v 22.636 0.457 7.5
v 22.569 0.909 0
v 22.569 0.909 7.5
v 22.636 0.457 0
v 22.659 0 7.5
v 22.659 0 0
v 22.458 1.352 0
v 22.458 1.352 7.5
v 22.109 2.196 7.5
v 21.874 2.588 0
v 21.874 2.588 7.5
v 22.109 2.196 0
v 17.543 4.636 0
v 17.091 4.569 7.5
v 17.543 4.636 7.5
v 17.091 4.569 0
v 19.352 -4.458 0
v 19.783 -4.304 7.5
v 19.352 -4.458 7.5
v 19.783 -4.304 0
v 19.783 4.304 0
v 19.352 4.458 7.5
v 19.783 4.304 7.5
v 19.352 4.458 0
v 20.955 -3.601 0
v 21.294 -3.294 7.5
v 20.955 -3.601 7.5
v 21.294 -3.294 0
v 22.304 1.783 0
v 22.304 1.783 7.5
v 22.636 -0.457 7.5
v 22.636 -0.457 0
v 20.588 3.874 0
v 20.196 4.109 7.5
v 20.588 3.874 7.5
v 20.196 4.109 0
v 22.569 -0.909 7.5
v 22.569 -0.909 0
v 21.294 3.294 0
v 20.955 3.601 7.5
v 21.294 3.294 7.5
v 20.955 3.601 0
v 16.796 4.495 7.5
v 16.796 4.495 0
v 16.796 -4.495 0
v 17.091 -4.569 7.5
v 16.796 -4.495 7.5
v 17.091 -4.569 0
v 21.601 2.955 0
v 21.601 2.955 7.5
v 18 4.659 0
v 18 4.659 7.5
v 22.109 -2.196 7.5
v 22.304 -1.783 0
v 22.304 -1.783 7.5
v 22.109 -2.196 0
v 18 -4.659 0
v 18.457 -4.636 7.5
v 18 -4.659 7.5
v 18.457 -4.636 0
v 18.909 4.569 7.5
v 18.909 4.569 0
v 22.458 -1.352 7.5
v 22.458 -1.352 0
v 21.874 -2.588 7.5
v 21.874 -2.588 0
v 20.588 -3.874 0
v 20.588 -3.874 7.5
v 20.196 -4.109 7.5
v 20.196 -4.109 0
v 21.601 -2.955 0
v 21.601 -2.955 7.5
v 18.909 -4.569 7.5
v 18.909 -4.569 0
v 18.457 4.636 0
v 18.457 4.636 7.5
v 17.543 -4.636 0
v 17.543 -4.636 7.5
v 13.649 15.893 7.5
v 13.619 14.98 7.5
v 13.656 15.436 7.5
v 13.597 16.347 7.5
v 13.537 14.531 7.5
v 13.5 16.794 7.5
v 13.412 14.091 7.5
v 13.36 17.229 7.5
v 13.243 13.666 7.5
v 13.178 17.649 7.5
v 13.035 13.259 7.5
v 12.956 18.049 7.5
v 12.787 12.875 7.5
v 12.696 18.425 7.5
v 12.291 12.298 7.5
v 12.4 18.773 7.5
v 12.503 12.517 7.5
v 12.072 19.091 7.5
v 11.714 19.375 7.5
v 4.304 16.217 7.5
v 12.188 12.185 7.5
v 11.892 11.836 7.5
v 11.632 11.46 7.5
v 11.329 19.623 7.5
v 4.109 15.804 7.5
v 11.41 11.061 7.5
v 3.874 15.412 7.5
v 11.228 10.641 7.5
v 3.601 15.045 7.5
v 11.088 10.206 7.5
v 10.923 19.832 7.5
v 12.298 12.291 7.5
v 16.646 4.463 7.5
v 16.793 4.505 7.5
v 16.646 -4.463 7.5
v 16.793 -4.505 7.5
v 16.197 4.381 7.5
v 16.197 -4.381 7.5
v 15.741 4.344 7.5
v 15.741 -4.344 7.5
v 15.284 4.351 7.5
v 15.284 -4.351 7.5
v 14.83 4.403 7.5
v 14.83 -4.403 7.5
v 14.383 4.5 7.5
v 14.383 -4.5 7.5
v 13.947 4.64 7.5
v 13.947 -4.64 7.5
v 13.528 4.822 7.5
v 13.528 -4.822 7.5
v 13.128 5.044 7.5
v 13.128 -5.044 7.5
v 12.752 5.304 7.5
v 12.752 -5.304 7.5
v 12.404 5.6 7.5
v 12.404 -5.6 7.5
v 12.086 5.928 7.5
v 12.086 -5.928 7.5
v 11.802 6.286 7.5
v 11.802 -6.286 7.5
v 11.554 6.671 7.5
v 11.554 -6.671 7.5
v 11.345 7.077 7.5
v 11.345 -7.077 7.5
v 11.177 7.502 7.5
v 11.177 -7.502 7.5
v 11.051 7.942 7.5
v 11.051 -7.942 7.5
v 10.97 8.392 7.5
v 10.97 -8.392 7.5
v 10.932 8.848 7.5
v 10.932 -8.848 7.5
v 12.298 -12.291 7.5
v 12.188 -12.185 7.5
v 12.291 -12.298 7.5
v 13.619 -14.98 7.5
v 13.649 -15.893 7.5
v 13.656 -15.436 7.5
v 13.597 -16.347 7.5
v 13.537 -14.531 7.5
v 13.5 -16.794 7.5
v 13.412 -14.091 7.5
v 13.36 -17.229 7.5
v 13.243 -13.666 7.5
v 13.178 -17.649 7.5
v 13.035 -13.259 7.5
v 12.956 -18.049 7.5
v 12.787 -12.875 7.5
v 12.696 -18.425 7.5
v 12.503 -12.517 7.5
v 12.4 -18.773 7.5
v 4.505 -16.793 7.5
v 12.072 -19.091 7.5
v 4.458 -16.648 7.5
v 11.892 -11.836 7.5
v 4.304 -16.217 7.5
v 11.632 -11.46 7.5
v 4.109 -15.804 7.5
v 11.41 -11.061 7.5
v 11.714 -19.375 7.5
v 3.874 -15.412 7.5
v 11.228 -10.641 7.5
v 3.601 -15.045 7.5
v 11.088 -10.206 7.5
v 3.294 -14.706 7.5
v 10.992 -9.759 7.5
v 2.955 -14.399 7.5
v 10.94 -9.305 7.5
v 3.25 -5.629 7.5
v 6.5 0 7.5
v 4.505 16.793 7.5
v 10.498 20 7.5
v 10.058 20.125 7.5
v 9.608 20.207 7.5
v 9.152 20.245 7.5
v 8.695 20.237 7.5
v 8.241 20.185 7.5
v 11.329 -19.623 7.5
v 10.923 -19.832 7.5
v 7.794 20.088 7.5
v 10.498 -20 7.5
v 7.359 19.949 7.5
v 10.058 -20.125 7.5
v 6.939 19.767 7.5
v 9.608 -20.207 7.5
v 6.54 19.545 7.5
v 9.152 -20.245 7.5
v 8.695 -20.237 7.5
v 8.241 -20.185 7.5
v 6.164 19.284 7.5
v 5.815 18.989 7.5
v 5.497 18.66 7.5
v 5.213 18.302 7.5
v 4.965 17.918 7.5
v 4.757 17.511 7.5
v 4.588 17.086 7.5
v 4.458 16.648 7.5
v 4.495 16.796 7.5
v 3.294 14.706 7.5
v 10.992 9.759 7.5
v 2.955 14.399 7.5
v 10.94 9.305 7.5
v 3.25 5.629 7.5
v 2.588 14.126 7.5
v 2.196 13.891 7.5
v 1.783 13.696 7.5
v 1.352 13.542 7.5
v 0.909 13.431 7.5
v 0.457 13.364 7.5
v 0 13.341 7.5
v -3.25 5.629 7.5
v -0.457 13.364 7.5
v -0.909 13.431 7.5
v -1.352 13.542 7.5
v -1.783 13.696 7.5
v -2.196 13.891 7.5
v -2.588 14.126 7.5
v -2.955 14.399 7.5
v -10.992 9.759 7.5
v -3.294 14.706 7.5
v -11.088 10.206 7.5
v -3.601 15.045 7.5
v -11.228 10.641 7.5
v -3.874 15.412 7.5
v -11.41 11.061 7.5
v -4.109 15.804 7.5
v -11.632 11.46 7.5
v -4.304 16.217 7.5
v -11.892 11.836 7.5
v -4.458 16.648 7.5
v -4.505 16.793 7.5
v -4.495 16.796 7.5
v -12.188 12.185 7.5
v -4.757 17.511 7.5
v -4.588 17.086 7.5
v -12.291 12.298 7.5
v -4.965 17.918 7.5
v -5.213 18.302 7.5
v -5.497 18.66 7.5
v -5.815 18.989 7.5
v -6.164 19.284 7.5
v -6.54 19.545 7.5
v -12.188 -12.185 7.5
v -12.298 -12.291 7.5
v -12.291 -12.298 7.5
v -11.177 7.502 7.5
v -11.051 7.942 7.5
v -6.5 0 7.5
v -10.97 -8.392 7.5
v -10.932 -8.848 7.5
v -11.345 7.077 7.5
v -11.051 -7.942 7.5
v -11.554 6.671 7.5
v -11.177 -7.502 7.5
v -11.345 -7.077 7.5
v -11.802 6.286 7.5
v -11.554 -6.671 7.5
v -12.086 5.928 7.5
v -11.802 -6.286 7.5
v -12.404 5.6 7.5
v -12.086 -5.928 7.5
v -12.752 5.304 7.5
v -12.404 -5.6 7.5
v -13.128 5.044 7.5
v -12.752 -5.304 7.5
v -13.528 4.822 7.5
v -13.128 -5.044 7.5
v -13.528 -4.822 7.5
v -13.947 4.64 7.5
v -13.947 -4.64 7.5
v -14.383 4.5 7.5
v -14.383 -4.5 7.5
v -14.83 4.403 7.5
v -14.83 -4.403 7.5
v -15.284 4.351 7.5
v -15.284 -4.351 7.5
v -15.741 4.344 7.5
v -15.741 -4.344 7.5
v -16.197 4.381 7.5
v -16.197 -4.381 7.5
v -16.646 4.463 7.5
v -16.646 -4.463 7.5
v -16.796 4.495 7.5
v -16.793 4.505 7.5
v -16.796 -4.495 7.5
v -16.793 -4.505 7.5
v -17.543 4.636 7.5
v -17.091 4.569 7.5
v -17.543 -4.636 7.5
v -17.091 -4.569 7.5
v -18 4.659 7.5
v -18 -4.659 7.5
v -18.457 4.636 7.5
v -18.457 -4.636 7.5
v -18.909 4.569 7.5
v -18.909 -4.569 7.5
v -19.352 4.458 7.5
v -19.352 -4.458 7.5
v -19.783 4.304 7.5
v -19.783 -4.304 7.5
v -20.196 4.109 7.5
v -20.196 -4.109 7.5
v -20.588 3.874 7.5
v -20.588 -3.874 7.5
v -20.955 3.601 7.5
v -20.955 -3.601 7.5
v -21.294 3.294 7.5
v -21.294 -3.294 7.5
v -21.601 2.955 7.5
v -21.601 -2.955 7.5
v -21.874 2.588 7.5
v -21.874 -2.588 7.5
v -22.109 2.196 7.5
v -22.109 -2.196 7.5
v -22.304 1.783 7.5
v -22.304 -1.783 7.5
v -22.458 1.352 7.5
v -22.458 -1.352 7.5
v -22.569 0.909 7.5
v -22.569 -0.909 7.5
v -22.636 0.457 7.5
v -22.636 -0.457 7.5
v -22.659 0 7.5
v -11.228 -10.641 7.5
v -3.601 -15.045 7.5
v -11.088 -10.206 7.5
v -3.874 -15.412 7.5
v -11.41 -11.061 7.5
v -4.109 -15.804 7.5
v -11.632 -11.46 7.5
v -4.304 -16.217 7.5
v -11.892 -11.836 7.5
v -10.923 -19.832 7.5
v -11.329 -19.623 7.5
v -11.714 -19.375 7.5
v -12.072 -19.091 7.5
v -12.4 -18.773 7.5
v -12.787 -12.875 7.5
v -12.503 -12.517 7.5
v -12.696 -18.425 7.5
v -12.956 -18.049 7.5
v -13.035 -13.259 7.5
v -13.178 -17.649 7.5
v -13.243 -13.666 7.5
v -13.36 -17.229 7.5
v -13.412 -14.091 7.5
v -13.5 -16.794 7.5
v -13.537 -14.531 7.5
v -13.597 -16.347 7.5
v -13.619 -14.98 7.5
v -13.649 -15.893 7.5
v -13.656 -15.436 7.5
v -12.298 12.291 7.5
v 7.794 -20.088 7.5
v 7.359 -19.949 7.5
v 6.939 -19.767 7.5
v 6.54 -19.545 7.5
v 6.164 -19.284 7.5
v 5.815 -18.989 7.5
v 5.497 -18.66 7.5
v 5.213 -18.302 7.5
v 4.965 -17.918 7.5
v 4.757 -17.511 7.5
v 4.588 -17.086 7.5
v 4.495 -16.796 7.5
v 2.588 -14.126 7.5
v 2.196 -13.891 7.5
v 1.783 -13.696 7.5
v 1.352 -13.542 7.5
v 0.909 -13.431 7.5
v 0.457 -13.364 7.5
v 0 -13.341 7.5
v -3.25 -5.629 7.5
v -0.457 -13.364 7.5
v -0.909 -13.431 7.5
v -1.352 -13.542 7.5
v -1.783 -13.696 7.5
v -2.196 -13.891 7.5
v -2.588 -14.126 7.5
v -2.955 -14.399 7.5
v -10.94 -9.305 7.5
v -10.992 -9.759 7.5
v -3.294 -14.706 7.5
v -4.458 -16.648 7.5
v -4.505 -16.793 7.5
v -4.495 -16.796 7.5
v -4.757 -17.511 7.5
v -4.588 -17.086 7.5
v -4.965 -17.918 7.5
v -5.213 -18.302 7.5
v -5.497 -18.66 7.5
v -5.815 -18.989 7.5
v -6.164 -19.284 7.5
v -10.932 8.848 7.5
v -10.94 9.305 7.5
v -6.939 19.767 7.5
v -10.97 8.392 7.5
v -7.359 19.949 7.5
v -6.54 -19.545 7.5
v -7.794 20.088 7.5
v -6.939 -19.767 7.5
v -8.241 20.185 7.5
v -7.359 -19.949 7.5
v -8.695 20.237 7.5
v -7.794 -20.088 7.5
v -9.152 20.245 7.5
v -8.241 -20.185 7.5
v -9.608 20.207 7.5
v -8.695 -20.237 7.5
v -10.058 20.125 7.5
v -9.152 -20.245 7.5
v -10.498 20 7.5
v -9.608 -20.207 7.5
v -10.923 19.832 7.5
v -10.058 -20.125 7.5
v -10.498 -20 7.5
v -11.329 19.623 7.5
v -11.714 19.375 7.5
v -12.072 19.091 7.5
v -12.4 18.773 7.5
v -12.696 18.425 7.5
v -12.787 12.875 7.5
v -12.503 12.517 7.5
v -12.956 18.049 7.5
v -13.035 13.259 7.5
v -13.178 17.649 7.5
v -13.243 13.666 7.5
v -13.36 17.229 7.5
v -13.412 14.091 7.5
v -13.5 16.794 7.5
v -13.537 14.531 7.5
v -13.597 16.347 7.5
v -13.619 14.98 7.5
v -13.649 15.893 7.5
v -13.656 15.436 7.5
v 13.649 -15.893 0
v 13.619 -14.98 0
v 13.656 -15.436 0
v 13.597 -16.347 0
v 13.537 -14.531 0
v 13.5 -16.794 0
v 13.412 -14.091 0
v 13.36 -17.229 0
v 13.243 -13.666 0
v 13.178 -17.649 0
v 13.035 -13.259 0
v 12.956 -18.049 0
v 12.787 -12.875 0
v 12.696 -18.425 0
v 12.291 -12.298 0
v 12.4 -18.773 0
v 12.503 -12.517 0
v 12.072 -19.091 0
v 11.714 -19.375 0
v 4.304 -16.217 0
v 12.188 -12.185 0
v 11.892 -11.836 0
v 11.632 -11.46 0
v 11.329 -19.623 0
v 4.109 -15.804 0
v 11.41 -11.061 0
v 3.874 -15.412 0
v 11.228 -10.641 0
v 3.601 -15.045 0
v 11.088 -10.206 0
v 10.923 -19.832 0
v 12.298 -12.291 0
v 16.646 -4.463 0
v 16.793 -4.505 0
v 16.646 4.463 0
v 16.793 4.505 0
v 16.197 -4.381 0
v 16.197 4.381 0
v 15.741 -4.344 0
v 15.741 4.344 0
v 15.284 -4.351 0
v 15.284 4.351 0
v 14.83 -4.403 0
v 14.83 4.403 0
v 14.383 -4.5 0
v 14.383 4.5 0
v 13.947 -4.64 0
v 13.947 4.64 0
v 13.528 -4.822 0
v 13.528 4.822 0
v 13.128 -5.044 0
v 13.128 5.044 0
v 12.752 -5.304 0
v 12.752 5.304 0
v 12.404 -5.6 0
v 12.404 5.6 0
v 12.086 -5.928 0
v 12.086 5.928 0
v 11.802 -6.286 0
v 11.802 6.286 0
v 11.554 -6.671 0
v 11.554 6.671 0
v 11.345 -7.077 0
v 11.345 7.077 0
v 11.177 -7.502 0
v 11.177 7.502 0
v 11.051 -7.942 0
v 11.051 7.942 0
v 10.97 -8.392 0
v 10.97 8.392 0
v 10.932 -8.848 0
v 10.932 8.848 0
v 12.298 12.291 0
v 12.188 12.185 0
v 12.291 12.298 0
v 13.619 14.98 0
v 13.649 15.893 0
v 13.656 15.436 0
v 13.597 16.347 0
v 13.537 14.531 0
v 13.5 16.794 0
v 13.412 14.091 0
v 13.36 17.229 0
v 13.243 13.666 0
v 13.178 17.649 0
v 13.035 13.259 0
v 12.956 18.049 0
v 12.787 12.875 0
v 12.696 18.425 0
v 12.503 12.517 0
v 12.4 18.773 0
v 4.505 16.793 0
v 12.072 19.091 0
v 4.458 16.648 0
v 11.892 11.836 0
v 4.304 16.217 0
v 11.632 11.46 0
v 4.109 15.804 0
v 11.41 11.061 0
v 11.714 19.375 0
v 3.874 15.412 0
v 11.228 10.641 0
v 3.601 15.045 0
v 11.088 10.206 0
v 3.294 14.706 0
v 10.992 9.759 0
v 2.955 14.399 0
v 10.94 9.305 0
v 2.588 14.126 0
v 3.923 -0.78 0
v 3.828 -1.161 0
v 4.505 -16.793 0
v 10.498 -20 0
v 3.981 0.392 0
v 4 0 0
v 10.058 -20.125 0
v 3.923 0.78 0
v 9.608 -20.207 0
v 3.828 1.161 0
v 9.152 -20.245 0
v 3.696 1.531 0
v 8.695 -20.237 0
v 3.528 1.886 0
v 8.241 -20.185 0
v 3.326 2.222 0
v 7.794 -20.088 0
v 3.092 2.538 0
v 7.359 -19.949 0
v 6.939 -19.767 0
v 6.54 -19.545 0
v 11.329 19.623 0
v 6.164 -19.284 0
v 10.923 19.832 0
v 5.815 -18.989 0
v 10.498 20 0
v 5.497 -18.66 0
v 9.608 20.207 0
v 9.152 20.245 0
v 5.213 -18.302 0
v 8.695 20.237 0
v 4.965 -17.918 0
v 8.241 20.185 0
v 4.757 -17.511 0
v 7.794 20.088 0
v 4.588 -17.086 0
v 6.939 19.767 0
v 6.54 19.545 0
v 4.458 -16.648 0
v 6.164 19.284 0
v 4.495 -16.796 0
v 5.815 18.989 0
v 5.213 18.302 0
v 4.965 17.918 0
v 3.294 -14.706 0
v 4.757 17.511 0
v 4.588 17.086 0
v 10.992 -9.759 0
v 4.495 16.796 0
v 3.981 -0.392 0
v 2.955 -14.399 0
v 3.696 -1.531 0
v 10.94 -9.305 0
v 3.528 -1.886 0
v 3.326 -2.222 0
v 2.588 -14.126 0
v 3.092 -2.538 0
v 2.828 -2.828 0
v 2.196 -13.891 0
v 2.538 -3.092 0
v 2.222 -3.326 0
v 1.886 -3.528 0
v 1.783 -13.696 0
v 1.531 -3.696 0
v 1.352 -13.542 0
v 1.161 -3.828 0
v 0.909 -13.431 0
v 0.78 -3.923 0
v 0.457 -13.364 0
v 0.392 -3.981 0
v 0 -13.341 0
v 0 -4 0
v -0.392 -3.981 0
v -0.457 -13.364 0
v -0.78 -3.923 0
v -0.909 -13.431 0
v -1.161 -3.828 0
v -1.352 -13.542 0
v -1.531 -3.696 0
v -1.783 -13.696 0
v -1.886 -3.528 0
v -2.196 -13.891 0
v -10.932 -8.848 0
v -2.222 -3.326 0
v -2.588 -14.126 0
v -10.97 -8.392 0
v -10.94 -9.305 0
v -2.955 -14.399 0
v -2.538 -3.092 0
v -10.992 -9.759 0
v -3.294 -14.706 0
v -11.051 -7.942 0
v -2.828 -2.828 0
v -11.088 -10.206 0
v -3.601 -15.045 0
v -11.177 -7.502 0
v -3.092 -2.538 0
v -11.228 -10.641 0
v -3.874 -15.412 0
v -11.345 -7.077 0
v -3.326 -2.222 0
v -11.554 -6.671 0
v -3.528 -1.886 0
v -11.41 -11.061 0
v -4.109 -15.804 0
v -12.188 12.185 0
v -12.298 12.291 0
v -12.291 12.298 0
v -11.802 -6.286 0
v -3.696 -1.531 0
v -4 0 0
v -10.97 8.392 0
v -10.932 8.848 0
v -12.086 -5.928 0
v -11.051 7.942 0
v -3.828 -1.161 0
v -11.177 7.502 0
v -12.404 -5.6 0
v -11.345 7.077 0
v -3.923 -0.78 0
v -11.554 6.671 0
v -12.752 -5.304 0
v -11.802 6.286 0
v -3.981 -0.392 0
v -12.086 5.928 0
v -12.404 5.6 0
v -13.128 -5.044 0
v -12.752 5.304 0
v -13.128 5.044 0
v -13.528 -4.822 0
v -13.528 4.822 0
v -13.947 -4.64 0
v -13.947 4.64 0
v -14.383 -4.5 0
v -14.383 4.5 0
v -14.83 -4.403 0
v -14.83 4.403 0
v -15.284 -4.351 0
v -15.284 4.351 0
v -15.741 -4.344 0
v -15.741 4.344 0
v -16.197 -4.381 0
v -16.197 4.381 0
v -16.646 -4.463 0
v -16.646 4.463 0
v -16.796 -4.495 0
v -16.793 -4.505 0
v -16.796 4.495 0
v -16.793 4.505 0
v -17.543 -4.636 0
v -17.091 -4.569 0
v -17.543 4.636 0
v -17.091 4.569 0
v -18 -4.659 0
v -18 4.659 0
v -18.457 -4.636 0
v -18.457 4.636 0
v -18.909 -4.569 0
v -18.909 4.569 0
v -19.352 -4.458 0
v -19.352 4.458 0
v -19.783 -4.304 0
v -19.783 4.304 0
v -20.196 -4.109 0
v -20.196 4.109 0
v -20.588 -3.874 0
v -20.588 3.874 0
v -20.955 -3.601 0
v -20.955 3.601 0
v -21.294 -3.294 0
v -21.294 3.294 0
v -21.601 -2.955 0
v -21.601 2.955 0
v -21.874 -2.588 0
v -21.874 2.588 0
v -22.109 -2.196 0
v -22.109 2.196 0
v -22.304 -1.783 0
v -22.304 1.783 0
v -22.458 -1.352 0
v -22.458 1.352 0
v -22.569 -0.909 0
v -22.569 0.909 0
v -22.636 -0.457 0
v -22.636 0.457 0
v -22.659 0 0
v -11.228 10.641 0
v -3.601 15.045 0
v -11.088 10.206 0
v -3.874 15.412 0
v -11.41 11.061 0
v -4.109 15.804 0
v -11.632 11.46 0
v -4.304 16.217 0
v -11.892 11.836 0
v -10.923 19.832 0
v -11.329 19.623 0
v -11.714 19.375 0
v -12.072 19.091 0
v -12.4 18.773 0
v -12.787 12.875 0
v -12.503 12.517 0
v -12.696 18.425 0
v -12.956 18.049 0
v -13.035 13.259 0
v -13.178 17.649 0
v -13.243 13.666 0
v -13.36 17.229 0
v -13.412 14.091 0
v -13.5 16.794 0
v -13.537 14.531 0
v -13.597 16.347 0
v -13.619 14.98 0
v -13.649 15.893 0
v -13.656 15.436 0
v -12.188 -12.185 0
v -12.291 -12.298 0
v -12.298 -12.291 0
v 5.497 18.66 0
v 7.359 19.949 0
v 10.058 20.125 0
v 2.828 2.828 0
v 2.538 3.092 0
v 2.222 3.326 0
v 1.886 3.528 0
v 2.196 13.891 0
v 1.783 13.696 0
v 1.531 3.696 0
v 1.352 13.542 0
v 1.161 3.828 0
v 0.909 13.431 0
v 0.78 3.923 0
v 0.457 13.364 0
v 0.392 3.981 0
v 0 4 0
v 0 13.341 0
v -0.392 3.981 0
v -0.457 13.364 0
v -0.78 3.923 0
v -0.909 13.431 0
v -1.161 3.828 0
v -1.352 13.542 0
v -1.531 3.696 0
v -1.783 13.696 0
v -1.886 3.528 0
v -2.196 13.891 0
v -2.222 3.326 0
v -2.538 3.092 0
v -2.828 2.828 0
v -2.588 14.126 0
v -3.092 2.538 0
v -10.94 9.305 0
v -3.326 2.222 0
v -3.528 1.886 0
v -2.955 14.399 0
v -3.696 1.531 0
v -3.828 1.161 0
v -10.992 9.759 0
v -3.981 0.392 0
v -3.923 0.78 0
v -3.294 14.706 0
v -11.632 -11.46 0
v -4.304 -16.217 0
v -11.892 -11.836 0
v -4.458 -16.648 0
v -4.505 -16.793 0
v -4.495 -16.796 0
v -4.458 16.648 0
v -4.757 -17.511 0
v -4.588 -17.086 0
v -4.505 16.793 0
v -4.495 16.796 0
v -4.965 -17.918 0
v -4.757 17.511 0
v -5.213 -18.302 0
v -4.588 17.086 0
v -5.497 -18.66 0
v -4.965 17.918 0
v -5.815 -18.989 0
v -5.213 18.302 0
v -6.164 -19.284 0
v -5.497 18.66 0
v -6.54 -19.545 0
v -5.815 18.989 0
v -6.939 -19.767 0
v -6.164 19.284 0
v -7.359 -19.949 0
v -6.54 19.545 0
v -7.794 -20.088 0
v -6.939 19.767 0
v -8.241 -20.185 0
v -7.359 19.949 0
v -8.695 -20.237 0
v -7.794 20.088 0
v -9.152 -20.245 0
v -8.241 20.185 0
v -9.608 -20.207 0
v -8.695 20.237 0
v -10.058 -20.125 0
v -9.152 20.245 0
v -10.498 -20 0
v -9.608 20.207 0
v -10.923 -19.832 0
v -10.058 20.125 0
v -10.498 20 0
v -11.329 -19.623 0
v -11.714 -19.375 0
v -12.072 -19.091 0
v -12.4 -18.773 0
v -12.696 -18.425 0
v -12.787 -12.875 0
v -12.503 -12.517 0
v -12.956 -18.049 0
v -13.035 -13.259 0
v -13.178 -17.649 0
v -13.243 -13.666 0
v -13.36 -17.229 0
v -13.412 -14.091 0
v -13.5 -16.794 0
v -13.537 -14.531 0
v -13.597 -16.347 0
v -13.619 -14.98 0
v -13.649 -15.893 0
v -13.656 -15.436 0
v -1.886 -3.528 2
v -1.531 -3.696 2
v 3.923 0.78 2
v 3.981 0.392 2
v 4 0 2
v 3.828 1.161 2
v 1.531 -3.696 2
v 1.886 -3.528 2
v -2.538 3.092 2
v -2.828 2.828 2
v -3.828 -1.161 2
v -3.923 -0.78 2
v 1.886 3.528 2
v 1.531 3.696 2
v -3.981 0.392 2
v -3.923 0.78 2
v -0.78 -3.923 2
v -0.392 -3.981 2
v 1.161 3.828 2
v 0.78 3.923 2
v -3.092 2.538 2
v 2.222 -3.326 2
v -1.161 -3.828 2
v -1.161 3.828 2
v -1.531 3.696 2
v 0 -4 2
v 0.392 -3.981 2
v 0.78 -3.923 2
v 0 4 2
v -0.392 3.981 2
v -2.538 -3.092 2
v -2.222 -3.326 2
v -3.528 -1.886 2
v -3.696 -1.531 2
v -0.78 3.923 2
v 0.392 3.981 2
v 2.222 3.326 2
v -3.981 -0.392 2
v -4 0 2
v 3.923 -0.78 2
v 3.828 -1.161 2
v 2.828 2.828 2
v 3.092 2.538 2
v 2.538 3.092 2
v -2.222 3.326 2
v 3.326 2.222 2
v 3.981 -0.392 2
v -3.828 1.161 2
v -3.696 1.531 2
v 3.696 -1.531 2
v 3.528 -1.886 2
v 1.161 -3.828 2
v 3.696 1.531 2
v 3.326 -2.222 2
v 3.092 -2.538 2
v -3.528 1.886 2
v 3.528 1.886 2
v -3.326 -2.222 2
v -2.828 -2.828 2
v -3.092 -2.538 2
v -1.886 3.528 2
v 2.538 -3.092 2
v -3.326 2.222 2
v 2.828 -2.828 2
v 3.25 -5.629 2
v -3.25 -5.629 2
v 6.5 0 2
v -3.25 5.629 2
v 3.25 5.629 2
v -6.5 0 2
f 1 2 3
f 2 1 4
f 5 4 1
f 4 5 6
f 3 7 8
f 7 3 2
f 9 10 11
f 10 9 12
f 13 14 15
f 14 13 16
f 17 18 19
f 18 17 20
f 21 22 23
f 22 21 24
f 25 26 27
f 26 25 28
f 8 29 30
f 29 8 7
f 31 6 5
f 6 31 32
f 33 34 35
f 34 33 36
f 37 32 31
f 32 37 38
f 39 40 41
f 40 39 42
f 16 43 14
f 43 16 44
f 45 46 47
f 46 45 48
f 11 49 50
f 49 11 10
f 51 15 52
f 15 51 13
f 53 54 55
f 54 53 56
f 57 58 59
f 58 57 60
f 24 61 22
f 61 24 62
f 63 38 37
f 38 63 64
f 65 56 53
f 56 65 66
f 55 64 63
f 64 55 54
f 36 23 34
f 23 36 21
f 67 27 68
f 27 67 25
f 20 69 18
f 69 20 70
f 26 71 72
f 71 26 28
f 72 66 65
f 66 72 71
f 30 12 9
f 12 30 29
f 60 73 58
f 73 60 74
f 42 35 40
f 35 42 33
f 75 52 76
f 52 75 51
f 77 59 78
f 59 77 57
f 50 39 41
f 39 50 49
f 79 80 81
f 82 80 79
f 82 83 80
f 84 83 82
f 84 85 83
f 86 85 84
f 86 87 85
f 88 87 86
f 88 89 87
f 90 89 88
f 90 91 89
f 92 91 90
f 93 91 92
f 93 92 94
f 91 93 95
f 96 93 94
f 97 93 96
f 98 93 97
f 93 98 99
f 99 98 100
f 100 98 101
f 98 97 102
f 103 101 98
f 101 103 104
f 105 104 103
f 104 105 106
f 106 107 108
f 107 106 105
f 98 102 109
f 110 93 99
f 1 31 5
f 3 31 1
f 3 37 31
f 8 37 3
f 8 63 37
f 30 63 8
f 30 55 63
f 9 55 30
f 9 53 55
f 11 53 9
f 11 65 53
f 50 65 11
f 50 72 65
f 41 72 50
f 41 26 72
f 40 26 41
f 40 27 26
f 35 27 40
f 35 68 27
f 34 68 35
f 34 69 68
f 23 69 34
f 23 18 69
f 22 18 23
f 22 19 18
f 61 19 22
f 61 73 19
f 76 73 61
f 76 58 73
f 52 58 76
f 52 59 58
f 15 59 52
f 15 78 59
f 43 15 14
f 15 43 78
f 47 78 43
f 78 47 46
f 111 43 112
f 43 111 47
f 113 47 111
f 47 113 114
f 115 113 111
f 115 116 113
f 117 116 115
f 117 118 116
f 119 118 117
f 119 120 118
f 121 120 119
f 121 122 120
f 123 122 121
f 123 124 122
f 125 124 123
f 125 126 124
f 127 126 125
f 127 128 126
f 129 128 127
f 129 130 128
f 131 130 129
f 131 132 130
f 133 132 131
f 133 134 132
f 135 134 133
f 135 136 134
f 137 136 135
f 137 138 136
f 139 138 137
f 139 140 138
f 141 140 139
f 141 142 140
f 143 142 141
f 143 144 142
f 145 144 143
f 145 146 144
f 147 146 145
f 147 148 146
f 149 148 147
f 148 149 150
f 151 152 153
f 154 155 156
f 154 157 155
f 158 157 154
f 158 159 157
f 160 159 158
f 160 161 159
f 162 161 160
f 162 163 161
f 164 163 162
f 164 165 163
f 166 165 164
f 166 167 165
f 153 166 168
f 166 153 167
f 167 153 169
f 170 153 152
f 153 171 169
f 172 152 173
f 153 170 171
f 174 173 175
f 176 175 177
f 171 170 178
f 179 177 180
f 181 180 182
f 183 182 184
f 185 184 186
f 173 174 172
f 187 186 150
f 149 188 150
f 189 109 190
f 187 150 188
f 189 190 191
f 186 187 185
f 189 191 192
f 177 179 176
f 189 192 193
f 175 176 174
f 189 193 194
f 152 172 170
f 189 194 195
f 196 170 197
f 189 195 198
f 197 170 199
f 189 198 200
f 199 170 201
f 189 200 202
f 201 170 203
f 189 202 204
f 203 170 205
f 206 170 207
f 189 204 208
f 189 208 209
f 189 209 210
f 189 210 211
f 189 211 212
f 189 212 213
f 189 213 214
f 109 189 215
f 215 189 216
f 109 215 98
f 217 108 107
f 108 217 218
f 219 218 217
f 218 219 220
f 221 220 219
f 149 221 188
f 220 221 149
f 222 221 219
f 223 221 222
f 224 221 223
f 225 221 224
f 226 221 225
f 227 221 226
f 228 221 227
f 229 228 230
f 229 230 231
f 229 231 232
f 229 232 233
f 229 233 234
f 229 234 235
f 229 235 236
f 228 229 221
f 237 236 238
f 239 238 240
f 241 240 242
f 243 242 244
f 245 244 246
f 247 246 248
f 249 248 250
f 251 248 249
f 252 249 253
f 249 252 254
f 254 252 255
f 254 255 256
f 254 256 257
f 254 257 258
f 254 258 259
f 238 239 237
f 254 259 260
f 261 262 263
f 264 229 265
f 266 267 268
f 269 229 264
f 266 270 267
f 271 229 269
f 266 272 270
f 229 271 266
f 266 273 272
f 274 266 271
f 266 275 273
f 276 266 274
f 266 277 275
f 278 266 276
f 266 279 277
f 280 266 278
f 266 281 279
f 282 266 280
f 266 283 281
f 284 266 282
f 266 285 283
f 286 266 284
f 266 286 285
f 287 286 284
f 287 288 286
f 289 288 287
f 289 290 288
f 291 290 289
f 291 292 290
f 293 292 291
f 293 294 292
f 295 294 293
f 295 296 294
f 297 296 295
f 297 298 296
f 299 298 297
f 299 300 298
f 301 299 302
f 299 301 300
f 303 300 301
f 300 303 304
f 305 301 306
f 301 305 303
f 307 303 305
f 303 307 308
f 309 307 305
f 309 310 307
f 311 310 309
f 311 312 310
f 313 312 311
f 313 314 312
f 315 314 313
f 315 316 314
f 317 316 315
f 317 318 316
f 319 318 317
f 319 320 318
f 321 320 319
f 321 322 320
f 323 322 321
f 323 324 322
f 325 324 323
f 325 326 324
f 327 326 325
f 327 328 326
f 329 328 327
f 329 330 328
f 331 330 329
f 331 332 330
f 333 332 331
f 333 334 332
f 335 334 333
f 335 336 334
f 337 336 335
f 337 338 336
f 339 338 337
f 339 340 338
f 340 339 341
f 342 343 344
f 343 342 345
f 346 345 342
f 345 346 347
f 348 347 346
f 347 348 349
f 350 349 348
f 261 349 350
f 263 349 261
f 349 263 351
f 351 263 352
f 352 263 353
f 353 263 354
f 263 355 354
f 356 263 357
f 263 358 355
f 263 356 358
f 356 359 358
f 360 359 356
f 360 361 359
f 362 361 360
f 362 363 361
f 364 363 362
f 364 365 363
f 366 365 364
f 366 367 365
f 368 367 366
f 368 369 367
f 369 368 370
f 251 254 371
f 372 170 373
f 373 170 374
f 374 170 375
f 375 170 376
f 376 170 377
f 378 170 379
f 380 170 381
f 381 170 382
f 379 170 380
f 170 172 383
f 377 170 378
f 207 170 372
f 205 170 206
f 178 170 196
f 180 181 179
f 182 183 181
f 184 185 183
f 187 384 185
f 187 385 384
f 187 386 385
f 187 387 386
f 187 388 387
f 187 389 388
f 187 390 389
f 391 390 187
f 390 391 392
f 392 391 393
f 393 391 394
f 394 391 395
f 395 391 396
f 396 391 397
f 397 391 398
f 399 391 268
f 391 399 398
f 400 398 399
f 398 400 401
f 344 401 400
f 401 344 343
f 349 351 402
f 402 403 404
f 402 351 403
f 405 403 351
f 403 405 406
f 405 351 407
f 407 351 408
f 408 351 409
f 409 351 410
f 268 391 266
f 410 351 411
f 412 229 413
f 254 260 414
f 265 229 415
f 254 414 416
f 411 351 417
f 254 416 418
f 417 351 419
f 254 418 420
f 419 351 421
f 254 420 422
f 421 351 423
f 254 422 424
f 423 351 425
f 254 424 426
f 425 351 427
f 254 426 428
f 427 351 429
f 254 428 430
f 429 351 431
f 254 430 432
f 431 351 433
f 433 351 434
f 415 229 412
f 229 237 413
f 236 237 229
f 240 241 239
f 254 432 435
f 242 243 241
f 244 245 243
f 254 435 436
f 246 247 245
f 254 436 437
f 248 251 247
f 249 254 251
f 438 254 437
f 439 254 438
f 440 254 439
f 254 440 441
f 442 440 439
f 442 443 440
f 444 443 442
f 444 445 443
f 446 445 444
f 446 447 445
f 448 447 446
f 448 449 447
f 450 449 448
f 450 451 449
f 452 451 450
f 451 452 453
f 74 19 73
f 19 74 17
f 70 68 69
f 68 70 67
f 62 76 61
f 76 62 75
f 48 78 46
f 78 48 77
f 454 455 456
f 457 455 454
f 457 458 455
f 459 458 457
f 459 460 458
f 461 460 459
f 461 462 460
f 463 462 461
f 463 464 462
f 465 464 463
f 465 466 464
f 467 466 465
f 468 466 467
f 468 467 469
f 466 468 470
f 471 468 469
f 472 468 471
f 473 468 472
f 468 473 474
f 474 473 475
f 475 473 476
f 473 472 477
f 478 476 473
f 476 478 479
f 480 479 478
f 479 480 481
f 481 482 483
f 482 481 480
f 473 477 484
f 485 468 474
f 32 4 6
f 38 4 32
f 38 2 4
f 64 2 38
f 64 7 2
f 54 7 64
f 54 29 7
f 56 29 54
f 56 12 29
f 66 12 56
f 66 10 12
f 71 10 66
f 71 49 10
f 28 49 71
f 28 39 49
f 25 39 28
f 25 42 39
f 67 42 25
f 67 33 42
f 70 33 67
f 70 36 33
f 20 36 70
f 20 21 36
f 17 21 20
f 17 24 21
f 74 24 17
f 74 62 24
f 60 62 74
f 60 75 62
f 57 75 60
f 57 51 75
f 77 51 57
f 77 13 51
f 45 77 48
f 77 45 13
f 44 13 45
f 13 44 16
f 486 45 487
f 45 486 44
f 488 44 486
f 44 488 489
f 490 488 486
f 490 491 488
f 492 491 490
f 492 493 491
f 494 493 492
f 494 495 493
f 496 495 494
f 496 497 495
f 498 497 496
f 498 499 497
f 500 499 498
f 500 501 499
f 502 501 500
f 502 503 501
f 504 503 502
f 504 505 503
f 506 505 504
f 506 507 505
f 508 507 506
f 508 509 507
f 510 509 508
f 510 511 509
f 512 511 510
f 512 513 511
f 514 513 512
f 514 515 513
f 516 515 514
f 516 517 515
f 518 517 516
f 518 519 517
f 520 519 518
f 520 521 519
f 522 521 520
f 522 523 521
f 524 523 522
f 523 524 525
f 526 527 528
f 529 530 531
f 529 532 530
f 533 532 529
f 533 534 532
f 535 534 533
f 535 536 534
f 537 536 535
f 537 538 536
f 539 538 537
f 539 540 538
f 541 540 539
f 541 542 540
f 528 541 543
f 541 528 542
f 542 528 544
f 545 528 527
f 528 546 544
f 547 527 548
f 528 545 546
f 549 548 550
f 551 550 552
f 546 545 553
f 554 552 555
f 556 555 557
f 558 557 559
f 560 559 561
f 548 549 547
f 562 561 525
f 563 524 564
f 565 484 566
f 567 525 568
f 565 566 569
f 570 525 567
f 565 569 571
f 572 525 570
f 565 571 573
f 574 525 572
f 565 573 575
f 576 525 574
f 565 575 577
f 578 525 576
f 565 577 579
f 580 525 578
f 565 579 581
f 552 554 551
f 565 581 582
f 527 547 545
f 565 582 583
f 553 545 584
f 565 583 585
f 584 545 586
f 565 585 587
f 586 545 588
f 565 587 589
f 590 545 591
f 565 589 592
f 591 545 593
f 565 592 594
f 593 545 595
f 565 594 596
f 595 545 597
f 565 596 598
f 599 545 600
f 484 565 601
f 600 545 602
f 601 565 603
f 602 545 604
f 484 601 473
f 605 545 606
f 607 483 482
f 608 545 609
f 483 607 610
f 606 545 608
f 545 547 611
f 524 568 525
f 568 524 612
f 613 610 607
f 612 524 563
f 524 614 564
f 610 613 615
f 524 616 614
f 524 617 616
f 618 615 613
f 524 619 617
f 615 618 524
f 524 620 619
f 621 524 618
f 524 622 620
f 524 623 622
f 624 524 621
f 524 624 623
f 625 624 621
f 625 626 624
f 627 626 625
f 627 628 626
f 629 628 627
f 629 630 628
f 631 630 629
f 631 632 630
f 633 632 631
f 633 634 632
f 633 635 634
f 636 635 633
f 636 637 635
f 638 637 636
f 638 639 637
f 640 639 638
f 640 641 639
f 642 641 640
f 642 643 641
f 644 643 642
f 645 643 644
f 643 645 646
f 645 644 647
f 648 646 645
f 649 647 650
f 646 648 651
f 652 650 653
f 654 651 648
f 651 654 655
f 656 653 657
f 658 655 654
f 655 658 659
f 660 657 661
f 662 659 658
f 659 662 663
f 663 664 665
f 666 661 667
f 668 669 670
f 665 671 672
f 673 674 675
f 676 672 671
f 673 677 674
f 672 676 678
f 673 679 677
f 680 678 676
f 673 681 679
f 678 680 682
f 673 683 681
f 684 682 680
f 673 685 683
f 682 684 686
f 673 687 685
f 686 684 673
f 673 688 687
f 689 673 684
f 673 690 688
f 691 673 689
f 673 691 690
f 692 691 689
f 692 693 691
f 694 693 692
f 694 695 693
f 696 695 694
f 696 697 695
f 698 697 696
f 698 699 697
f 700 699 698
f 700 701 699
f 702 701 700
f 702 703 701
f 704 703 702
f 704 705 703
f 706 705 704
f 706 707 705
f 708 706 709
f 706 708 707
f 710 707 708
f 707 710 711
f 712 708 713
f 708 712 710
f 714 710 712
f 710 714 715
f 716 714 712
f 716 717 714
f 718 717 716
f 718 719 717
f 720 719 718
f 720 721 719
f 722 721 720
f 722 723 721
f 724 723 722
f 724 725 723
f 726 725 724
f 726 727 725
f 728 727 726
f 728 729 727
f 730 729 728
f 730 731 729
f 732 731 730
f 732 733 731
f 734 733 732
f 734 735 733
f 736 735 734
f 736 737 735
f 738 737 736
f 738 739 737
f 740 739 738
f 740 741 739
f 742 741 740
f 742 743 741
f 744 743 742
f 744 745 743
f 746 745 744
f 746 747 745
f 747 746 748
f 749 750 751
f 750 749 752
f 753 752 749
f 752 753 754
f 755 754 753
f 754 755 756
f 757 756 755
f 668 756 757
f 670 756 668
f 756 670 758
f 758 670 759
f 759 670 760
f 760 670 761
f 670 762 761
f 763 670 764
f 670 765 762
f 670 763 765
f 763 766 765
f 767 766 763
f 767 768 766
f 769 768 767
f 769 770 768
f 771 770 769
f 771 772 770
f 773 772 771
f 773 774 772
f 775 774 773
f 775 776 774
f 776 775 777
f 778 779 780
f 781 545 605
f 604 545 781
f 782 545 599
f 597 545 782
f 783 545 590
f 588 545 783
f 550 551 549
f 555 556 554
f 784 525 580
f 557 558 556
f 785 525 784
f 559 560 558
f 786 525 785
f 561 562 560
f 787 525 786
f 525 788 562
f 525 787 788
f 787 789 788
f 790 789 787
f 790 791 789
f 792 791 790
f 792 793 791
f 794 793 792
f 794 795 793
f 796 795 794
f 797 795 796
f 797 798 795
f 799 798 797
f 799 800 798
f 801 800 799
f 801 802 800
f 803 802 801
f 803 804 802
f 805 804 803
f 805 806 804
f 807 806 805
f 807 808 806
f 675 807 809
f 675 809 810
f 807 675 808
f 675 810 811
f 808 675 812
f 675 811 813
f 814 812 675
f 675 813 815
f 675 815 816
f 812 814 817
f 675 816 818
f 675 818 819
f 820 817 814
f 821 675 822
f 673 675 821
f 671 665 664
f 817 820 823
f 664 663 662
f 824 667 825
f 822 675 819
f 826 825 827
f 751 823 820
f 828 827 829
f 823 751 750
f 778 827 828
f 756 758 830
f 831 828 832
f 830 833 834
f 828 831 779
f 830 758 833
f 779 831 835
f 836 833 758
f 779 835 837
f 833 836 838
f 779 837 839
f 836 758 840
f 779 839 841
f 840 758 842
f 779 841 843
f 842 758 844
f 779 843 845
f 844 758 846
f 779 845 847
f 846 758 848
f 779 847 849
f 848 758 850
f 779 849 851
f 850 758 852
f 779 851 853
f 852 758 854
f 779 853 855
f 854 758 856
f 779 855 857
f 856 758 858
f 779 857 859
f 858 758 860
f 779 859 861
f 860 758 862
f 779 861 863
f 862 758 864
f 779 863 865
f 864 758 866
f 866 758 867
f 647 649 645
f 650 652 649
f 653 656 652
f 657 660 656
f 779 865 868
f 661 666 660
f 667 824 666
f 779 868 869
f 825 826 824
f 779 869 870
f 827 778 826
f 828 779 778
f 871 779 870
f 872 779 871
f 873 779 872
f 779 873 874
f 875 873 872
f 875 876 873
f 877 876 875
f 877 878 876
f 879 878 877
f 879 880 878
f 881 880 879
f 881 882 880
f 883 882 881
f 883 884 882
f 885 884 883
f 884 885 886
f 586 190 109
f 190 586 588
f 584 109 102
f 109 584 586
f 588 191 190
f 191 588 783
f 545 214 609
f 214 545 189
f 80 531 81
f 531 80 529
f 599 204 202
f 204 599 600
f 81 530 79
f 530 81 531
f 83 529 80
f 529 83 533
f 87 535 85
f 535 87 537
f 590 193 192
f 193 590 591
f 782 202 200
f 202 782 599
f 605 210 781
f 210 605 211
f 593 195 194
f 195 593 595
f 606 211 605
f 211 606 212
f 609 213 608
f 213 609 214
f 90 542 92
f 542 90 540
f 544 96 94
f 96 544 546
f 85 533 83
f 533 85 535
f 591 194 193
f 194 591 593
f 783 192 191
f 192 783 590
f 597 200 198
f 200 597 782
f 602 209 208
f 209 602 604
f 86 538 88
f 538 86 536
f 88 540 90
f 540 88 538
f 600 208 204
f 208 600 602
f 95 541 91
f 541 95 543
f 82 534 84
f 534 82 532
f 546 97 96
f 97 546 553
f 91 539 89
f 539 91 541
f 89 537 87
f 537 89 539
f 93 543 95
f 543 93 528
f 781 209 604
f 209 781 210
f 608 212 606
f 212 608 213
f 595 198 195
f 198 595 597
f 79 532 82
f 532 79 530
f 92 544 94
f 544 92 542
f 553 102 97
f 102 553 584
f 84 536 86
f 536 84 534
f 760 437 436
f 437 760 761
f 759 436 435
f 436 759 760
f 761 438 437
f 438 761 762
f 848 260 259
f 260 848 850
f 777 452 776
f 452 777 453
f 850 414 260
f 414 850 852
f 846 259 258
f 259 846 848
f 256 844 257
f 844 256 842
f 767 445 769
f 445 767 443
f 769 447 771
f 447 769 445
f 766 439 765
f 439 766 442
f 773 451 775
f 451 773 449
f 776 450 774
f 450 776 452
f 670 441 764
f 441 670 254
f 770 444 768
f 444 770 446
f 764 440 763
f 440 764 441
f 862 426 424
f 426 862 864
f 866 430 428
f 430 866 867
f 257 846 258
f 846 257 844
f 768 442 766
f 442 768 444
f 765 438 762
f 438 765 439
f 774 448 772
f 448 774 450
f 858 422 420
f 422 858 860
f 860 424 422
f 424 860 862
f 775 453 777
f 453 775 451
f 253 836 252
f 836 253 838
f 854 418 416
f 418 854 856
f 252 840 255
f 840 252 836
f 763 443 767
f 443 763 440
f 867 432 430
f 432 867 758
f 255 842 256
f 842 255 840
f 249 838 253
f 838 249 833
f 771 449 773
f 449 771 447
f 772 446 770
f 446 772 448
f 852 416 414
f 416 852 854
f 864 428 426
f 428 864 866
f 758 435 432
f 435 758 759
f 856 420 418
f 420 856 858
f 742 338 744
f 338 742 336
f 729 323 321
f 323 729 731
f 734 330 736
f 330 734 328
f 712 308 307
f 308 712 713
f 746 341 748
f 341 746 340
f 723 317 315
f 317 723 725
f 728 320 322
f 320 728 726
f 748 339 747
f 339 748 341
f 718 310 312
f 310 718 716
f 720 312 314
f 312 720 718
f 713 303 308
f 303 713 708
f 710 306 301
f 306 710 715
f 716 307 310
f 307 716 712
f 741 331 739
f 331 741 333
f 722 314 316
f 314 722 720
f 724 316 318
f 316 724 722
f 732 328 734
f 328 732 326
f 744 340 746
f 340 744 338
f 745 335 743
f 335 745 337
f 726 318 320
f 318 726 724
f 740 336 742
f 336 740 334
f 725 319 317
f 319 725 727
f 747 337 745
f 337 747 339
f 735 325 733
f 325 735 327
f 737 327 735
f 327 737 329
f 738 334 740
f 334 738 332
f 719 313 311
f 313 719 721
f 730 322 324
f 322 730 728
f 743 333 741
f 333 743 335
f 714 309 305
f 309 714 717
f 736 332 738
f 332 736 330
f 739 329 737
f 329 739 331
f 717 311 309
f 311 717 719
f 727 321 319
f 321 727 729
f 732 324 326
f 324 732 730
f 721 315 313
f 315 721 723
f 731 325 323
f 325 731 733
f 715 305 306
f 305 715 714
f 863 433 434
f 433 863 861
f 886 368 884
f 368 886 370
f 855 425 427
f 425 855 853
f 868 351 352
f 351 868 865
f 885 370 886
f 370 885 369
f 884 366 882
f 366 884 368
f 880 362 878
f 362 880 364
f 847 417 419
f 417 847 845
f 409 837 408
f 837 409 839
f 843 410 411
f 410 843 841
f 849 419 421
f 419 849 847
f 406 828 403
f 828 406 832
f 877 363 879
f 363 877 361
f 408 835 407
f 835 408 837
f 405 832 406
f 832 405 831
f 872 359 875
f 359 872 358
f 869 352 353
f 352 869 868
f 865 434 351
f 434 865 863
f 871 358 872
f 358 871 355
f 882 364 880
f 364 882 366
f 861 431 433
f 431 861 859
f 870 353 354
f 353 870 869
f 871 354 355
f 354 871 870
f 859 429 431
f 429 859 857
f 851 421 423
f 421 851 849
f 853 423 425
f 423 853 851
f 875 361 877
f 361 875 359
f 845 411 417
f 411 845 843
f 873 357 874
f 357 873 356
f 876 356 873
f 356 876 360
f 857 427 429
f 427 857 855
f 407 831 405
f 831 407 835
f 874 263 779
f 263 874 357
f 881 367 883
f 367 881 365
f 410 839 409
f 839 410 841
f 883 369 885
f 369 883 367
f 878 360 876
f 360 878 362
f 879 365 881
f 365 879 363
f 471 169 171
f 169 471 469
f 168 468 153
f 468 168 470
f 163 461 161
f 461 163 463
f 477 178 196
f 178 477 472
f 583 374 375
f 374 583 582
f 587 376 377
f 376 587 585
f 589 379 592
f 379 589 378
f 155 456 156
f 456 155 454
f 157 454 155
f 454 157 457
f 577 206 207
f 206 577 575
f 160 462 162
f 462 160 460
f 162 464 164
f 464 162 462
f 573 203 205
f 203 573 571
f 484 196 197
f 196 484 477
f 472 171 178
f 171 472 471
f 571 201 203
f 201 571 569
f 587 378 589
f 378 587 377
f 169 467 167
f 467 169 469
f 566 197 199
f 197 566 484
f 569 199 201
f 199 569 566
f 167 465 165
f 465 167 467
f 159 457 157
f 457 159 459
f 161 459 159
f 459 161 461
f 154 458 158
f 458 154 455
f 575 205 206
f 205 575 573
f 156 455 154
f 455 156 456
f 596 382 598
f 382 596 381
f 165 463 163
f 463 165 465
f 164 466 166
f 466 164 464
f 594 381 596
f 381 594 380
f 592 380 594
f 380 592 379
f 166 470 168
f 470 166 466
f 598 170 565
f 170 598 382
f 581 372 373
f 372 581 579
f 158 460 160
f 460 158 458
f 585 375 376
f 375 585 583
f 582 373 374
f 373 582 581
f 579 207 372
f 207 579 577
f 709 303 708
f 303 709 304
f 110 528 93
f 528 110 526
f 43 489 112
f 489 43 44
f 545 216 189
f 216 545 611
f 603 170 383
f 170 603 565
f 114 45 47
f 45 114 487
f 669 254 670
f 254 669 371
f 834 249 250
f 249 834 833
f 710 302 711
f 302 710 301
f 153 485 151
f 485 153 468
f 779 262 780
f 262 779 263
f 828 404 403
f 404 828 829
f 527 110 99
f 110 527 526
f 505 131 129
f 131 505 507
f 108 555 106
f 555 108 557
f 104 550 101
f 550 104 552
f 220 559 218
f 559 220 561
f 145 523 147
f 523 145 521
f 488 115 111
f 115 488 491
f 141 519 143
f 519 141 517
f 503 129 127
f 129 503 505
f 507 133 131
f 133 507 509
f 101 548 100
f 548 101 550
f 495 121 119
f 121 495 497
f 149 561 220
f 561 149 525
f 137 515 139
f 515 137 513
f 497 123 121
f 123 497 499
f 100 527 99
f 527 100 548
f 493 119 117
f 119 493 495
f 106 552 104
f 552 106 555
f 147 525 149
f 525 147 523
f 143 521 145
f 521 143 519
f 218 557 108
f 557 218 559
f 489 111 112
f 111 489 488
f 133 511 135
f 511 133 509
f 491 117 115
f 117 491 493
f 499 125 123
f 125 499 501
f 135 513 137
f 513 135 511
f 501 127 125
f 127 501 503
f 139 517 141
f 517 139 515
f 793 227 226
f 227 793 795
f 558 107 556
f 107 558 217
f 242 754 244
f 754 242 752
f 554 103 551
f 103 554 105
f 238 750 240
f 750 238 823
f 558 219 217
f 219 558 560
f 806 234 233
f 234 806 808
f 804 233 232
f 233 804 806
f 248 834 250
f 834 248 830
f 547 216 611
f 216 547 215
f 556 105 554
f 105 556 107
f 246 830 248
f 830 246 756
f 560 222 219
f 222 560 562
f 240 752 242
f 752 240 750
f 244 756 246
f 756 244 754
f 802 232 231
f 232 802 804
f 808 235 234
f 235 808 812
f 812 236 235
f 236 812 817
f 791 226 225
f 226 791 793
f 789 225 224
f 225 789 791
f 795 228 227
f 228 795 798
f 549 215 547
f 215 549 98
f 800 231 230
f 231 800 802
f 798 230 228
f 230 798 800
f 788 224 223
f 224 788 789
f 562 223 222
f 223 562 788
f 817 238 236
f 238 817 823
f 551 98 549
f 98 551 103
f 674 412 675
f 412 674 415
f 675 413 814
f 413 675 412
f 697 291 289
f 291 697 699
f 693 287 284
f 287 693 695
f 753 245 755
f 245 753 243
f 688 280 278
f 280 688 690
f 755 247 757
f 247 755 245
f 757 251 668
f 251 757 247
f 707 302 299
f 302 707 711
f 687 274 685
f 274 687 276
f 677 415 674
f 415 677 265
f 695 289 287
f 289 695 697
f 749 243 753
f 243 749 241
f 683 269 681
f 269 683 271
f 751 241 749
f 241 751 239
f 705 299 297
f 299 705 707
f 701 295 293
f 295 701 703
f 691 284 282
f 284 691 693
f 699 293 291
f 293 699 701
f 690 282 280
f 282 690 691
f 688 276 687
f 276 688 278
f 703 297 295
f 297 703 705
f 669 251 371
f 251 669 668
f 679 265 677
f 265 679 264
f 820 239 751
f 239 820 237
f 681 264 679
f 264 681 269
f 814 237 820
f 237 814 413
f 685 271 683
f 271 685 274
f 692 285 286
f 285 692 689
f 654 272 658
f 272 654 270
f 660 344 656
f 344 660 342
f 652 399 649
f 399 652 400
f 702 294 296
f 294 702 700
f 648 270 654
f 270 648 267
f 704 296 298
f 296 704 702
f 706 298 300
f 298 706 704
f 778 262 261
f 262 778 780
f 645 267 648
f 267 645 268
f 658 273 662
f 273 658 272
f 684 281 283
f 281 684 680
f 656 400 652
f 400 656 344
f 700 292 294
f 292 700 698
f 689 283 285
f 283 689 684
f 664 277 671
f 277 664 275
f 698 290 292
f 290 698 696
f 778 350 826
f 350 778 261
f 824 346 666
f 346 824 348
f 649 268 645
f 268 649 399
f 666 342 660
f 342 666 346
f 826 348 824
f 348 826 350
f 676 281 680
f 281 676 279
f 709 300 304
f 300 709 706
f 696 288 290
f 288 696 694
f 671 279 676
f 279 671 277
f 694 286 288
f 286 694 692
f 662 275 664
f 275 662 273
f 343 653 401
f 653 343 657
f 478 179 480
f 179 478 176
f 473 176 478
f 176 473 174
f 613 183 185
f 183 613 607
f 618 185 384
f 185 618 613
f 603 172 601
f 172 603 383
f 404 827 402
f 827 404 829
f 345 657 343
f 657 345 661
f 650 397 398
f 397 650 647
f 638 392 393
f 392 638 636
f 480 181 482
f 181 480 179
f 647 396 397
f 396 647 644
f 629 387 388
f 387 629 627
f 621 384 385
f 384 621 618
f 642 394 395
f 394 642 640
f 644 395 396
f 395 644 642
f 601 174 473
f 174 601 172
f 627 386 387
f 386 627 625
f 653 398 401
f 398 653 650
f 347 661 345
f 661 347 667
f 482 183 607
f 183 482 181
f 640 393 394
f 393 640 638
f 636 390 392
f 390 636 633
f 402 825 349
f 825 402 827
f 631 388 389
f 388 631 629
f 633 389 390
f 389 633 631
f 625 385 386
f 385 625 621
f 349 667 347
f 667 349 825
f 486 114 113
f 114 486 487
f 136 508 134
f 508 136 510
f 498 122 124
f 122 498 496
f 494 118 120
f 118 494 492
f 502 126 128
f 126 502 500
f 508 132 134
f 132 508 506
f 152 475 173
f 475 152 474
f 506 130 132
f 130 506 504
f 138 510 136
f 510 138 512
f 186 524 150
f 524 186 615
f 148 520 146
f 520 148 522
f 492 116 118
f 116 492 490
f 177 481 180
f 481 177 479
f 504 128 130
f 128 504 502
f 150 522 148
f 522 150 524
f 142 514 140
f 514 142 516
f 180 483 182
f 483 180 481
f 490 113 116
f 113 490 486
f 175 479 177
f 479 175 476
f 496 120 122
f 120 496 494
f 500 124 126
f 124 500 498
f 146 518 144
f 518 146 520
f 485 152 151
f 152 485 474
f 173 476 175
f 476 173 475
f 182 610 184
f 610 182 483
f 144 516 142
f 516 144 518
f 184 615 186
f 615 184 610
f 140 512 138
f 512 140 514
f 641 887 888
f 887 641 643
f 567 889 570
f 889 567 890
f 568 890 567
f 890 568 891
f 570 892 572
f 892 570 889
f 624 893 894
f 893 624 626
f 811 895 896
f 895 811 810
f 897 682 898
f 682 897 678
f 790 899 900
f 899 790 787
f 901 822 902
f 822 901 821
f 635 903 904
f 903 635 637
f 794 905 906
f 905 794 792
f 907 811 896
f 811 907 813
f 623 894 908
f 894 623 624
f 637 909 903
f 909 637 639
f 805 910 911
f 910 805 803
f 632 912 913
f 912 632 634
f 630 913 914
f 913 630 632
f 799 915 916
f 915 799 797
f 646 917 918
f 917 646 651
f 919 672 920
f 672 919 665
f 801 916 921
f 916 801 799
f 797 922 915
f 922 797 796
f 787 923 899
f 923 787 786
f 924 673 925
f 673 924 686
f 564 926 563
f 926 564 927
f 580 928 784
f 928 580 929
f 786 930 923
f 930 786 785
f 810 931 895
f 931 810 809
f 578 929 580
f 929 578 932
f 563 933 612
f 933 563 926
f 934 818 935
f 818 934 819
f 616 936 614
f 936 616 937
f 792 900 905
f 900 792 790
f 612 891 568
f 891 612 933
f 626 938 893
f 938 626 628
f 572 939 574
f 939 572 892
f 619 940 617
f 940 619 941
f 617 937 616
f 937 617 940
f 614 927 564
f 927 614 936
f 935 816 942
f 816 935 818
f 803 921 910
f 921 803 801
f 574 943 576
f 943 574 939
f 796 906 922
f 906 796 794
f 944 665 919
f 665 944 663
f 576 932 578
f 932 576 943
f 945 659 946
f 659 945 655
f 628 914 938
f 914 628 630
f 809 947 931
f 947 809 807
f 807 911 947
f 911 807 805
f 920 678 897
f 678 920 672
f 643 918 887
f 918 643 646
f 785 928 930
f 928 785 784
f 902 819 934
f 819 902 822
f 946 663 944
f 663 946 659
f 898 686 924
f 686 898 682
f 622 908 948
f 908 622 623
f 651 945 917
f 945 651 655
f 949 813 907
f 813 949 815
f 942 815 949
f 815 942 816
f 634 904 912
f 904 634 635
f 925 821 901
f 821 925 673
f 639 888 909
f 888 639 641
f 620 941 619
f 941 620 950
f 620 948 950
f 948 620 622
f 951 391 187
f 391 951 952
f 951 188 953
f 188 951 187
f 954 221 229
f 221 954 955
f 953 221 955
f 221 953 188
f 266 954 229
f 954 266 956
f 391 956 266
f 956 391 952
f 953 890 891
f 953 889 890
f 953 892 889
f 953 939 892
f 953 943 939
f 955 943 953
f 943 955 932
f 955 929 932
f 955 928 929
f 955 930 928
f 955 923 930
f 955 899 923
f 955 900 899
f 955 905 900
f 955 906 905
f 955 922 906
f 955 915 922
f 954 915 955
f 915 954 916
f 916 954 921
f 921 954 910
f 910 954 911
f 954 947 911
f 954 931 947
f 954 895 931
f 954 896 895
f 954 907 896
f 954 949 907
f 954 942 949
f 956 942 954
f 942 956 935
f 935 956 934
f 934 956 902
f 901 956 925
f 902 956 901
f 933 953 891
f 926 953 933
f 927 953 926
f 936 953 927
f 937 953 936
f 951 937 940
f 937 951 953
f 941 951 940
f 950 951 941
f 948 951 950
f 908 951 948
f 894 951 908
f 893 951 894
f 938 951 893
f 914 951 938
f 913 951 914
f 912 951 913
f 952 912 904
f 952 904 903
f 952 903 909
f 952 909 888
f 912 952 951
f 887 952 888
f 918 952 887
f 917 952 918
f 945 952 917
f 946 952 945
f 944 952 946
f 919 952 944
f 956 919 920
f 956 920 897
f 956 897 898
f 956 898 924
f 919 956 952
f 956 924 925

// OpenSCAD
/* Project: camera stab
1/4 inch jam nut that fixes the screwed-on sled in arbitrary orientation 
*/
$fn=64;
h=5.5;
wall=2;
id=8;
hex=13;
handle=36;
n=6;
difference() {
  handle(d=handle,h=h+wall,n=n);
  cylinder(d=id,h=h+wall+0.01);
  translate([0,0,wall])cylinder($fn=6,d=hex,h=h+0.01);
}
module handle(d,n,h) {
  difference() {
    union() {
      cylinder(d=d,h=h,$fn=2*n);
      for (i=[0:360/n:360]) {
        rotate([0,0,i])translate([d/2,0,0])cylinder(d=d*sin(90/n),h=h);
      }
    }
    for (i=[0:360/n:360]) {
      rotate([0,0,i+180/n])translate([d/2,0,-0.01])cylinder(d=d*sin(90/n),h=h+0.02);
    }
  }
}
